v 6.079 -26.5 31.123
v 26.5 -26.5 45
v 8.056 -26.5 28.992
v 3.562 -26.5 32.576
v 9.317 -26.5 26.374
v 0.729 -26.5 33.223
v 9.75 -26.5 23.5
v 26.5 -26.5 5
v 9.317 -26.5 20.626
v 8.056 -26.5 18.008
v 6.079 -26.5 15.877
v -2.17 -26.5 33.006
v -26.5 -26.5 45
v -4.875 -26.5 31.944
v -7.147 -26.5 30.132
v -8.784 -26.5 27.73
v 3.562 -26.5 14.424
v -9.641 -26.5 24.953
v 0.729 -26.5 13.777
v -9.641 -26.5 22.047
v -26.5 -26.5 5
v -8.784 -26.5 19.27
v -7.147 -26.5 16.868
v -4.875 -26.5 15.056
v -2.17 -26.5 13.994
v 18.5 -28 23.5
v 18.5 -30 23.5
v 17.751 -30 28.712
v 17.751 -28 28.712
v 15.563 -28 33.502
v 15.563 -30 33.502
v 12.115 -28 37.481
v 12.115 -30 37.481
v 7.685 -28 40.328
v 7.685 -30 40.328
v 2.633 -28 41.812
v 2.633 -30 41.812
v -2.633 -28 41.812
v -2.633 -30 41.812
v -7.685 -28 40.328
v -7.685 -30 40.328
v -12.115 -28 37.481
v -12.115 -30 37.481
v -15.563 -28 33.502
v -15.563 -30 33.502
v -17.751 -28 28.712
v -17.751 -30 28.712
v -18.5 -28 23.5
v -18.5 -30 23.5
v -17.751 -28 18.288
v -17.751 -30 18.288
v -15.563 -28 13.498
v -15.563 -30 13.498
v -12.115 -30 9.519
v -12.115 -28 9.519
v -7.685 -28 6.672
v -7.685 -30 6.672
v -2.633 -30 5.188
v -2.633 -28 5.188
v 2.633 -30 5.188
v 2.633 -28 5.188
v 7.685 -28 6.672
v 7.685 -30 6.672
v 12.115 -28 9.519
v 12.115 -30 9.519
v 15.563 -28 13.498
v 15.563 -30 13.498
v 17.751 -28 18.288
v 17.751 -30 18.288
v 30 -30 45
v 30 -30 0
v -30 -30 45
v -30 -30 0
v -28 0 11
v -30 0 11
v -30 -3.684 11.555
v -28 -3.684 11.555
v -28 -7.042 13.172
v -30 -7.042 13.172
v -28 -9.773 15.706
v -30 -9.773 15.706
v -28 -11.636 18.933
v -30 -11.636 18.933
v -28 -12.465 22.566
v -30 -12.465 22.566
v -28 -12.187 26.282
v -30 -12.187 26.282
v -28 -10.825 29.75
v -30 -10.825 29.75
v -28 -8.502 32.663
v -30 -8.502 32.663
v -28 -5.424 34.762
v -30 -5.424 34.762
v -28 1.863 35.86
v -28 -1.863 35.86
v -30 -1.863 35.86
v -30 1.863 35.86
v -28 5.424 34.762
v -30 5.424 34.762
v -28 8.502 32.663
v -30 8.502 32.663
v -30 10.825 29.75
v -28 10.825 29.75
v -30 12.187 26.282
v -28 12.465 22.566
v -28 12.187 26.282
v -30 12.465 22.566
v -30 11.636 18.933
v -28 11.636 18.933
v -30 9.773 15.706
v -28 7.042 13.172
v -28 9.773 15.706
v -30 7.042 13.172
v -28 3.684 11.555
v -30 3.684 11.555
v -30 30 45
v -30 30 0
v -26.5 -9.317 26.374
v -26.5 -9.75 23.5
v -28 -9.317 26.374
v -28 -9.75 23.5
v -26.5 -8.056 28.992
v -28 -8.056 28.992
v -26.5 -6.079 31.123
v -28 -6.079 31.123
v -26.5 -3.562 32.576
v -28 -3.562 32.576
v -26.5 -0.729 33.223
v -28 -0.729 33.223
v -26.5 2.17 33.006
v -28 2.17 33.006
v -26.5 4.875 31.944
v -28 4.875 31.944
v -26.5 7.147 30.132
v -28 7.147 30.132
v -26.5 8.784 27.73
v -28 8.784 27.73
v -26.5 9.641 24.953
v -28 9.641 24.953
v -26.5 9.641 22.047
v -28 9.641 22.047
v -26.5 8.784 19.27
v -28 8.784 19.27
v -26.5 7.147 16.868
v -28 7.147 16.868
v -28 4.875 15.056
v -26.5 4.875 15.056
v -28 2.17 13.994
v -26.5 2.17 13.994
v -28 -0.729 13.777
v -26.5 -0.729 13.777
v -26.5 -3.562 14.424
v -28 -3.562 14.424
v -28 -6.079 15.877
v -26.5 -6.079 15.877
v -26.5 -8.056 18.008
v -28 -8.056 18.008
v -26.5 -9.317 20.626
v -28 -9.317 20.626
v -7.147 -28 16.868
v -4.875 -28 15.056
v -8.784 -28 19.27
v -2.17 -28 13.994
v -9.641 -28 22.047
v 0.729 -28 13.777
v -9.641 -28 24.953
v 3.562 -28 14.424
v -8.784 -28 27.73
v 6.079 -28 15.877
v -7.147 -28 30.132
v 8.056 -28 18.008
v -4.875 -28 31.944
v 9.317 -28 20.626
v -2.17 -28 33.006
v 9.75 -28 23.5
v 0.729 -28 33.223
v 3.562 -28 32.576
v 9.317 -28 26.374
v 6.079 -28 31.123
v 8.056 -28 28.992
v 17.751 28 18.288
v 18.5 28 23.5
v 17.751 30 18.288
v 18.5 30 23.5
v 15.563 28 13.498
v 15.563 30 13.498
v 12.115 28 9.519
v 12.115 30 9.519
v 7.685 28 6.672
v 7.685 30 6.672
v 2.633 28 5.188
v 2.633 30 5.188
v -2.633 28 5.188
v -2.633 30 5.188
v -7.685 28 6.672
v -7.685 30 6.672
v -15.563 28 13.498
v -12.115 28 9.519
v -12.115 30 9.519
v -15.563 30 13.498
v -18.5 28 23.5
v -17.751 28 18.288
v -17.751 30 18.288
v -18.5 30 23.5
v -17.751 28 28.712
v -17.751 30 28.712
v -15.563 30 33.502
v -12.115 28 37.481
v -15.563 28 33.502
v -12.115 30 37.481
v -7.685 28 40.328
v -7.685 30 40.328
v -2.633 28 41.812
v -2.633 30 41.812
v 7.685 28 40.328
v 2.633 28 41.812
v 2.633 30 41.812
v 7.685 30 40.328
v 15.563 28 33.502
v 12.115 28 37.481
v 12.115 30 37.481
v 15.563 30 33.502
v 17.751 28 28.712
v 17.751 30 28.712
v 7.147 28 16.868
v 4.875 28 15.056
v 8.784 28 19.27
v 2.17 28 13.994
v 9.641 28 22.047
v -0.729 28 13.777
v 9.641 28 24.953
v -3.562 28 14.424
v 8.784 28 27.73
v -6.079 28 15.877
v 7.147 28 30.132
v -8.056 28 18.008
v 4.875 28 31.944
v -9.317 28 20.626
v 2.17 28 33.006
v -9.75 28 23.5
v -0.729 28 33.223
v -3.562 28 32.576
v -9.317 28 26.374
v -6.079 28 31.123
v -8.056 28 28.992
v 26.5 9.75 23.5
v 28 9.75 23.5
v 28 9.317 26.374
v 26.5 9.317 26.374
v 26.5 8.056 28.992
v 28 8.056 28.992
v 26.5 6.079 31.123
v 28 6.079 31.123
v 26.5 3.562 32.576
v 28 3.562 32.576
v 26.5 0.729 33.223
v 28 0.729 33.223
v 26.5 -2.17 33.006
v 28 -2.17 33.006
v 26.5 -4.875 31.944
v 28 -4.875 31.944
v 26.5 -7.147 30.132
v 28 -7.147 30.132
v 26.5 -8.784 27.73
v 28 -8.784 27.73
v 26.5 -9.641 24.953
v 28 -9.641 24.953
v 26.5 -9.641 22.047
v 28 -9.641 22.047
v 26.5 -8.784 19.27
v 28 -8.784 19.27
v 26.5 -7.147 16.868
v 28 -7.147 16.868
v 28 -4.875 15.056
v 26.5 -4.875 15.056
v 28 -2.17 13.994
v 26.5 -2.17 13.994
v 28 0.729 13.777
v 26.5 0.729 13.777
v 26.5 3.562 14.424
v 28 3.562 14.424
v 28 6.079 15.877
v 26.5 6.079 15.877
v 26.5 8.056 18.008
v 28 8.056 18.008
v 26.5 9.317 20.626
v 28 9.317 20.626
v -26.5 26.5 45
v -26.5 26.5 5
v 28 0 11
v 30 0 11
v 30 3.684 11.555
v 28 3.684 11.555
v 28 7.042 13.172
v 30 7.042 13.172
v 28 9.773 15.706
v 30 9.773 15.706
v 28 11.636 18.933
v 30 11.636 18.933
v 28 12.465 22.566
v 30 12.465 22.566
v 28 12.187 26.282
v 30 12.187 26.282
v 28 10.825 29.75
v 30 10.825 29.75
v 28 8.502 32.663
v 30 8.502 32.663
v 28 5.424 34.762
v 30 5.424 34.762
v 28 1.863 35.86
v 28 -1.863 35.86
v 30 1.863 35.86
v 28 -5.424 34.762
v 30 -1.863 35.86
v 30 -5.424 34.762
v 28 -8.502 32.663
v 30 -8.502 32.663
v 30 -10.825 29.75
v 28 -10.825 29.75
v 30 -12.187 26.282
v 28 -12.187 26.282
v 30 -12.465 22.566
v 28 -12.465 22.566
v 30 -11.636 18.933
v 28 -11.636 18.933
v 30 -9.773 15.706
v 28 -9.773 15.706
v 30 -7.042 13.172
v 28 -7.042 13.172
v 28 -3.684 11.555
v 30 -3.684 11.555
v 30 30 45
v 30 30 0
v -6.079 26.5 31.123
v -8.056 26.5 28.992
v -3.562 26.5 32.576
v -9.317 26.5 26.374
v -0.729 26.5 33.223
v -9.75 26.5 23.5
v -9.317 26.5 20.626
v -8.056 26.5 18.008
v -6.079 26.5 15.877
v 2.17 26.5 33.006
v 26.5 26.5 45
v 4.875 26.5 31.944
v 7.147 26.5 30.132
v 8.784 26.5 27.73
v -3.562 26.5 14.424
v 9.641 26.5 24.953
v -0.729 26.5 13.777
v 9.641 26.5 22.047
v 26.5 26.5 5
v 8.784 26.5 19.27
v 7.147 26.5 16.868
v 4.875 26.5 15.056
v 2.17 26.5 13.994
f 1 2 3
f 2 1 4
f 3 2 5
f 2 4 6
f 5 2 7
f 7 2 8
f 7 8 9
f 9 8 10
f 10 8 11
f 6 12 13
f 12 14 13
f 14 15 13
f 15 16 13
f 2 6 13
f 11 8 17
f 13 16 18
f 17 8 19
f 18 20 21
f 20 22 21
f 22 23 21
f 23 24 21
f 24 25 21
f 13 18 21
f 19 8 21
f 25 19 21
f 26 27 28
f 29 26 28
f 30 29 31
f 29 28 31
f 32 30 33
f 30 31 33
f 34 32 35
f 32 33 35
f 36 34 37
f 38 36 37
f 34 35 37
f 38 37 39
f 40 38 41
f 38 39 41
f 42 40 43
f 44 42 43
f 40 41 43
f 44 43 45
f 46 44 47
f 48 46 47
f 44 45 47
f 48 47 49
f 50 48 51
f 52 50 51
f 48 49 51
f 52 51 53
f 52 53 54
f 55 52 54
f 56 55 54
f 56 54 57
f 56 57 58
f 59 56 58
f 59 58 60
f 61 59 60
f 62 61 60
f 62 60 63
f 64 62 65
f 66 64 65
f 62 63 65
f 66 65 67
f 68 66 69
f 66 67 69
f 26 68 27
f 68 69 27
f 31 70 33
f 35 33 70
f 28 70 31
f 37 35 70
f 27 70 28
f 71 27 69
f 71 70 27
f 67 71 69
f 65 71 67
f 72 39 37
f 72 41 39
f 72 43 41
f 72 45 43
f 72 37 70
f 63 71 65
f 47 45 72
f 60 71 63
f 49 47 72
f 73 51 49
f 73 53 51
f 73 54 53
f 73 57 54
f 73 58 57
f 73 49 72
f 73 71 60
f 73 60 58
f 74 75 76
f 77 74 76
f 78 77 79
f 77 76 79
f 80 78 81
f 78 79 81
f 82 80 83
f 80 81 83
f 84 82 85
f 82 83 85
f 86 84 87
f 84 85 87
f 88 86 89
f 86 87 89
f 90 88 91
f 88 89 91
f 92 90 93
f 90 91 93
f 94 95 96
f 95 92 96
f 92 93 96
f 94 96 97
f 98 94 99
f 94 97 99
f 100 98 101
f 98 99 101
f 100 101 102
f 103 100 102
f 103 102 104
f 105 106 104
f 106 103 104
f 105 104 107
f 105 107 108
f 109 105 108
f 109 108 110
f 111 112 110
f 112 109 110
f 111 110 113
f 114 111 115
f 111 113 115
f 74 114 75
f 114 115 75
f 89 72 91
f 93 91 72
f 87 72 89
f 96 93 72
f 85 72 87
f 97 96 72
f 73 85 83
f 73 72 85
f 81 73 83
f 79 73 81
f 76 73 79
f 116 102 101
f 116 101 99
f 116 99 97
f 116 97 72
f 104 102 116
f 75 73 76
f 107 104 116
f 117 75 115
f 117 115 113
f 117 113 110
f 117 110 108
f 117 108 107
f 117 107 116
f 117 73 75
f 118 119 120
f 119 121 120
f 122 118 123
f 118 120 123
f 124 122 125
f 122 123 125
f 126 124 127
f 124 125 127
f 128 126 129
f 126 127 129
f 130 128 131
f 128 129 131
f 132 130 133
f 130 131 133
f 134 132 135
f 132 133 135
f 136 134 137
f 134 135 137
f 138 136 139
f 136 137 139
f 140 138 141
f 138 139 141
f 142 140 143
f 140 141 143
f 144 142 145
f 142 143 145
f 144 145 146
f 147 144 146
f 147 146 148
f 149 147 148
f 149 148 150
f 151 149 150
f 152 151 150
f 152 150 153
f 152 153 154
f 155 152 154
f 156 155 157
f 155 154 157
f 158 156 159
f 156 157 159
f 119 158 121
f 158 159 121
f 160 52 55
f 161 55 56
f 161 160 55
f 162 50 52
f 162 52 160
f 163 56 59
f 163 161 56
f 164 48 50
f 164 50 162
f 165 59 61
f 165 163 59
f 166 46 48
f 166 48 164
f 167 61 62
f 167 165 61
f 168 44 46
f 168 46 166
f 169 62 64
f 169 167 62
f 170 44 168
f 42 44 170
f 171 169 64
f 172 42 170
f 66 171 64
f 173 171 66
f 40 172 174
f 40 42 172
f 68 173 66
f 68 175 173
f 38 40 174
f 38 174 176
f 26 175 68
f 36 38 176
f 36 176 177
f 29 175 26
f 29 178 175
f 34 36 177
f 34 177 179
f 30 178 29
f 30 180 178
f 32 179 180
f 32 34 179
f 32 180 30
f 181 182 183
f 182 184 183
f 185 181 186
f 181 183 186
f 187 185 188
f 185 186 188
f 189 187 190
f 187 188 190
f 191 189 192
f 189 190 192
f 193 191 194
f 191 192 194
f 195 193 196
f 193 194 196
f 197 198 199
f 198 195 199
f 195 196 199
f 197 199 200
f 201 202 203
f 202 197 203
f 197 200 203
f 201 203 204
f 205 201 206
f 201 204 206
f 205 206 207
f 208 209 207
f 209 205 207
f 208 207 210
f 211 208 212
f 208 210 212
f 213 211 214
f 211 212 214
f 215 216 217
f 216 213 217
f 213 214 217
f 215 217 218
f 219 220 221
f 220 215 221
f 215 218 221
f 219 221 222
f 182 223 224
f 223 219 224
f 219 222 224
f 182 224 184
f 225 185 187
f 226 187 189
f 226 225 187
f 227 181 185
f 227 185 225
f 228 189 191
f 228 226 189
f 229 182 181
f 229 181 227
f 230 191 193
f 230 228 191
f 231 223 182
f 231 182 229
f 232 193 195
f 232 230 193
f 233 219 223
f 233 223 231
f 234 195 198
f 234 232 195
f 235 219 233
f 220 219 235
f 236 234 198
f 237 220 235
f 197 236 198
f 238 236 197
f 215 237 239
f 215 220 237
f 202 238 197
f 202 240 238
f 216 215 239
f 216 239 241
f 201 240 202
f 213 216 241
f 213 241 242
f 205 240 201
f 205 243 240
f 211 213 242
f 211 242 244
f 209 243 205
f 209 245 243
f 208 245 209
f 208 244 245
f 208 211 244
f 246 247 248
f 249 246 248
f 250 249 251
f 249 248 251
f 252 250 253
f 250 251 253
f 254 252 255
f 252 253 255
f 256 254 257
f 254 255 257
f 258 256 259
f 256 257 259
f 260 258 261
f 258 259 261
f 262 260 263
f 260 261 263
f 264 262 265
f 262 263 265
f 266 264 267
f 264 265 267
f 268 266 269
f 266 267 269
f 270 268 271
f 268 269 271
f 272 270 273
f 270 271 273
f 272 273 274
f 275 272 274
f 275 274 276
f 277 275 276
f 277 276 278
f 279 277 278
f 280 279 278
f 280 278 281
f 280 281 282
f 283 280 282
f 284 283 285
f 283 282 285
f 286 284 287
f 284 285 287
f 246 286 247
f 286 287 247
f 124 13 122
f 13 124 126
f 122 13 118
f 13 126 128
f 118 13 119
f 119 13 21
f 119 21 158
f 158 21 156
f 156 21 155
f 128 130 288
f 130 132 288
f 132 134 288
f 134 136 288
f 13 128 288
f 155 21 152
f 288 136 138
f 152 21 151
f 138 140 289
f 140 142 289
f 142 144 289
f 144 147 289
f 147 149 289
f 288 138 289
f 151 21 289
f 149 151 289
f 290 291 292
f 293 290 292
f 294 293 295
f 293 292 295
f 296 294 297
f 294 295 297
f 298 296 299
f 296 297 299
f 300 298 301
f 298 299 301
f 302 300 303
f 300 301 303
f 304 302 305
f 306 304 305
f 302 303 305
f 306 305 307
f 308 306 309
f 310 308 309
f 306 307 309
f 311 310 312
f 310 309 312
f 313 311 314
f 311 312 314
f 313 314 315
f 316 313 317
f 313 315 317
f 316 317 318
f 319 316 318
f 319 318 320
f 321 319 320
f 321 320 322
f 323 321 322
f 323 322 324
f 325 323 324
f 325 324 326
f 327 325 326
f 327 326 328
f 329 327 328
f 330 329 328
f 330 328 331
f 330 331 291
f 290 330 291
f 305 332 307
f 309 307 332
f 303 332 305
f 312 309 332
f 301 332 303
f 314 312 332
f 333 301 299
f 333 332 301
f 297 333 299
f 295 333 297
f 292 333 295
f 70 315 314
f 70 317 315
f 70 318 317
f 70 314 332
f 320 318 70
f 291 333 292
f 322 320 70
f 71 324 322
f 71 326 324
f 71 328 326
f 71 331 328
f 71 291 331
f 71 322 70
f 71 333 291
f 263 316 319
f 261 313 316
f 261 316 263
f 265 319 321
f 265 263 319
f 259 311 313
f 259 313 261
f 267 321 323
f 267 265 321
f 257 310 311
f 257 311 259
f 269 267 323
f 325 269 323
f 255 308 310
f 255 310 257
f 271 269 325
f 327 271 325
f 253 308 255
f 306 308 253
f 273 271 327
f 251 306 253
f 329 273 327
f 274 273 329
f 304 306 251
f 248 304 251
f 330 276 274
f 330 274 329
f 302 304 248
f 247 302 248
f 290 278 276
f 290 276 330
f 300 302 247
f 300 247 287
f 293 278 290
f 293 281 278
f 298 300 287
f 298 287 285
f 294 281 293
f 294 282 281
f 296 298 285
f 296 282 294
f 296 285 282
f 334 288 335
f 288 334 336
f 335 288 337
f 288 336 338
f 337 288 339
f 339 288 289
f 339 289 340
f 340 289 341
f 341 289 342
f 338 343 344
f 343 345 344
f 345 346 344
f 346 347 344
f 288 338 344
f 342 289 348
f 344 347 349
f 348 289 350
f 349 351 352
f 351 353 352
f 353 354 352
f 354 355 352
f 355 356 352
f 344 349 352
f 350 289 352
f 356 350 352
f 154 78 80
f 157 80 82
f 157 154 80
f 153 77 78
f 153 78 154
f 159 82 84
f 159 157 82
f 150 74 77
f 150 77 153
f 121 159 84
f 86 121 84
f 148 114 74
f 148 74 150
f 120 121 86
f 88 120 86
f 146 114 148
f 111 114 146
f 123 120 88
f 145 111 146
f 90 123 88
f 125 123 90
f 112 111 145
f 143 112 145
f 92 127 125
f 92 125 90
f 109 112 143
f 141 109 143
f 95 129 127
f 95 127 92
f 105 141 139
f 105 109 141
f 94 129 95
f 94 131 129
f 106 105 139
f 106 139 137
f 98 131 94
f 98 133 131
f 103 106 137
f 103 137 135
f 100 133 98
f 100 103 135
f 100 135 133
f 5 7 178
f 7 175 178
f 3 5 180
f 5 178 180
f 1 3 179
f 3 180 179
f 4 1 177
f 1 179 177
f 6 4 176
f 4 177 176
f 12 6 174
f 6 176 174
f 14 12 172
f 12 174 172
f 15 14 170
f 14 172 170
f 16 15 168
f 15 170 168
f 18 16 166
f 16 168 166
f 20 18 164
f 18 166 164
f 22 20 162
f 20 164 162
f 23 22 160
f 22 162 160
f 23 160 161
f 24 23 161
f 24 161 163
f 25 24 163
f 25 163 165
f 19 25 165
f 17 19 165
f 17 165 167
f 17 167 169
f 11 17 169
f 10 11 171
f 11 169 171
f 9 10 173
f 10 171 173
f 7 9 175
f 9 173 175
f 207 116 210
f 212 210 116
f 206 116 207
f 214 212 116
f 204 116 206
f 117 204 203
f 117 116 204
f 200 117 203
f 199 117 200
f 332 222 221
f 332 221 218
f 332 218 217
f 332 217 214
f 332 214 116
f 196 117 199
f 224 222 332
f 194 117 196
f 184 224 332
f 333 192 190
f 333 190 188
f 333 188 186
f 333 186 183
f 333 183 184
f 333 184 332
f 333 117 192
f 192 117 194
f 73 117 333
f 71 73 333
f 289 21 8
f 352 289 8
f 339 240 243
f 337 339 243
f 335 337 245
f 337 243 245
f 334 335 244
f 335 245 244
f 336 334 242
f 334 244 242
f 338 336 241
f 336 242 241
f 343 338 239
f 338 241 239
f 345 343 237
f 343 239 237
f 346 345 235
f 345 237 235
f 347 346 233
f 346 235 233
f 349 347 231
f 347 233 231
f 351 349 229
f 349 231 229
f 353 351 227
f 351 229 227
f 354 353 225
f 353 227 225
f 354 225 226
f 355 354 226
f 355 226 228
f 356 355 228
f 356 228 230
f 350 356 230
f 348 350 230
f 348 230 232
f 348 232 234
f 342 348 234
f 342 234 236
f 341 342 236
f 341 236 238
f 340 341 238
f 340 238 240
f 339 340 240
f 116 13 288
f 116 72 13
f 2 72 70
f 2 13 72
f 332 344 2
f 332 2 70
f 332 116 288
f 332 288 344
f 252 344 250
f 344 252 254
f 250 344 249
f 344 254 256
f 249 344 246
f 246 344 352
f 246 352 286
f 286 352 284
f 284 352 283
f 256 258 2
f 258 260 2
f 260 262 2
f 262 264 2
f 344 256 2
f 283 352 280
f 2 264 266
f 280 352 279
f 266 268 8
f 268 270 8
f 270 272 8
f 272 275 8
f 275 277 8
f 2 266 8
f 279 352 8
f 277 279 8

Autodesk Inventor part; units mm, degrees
ref_plane "YZ Plane" through (0, 0, 0) normal (1, 0, 0) x (0, 1, 0)
ref_plane "XZ Plane" through (0, 0, 0) normal (0, 1, 0) x (-1, 0, 0)
ref_plane "XY Plane" through (0, 0, 0) normal (0, 0, 1) x (1, 0, 0)
sketch "Sketch1" plane through (0, 0, 0) normal (0, 0, 1) x (1, 0, 0)
  line L0 (-30, 30) -> (30, 30)
  line L1 (30, 30) -> (30, -30)
  line L2 (30, -30) -> (-30, -30)
  line L3 (-30, -30) -> (-30, 30)
  point P0 (0, 0)
  dimension "d0" = 60
  dimension "d1" = 60
  dimension "d2" = 30
  dimension "d3" = 30
extrude "Extrusion1" add sketch "Sketch1" along normal blind 5
sketch "Sketch2" plane through (0, 0, 5) normal (0, 0, 1) x (1, 0, 0)
  line L0 (-26.5, 26.5) -> (26.5, 26.5)
  line L1 (26.5, 26.5) -> (26.5, -26.5)
  line L2 (26.5, -26.5) -> (-26.5, -26.5)
  line L3 (-26.5, -26.5) -> (-26.5, 26.5)
  line L4 (30, 30) -> (-30, 30) projected
  line L5 (30, -30) -> (30, 30) projected
  line L6 (-30, 30) -> (30, 30)
  line L7 (30, 30) -> (30, -30)
  line L8 (30, -30) -> (-30, -30)
  line L9 (-30, -30) -> (-30, 30)
  point P0 (0, 0)
  dimension "d6" = 53
  dimension "d7" = 53
  dimension "d8" = 26.5
  dimension "d9" = 26.5
extrude "Extrusion2" add sketch "Sketch2" along normal blind 40
sketch "Sketch3" plane through (-30, -30, 0) normal (0, -1, 0) x (1, 0, 0)
  circle A0 centre (30, 23.5) radius 18.5
  point P0 (30, 0)
  dimension "d12" = 37
  dimension "d13" = 23.5
extrude "Extrusion3" cut sketch "Sketch3" against normal blind 2
sketch "Sketch4" plane through (0, -28, 23.5) normal (0, -1, 0) x (1, 0, 0)
  circle A0 centre (0, 0) radius 9.75
  circle A1 centre (0, 0) radius 18.5 projected
  point P0 (0, -23.5)
  dimension "d19" = 19.5
extrude "Extrusion4" cut sketch "Sketch4" against normal blind 2 contours A0
pattern_circular "Circular Pattern2" count 4 over 360 about axis through (0, 0, -10) along (0, 0, 1) of "Extrusion4"
mirror "Mirror1" about plane through (0, 0, 0) normal (0, 1, 0) of "Extrusion3"
sketch "Sketch6" plane through (30, -30, 0) normal (1, 0, 0) x (0, 0, -1)
  circle A0 centre (-23.5, 30) radius 12.5
  circle A1 centre (-23.5, 30) radius 9.75 projected
  point P0 (0, 30)
  dimension "d28" = 25
extrude "Extrusion6" cut sketch "Sketch6" against normal blind 2 contours A0 | A1
mirror "Mirror2" about plane through (0, 0, 0) normal (1, 0, 0) of "Extrusion6"
equation "\"d2\" = 0.5 * d0"
equation "\"d3\" = 0.5 * d1"
equation "\"d8\" = 0.5 * d7"
equation "\"d9\" = 0.5 * d6"
properties part number "sampleChamber_singlePiece_filipeSample_V1"
